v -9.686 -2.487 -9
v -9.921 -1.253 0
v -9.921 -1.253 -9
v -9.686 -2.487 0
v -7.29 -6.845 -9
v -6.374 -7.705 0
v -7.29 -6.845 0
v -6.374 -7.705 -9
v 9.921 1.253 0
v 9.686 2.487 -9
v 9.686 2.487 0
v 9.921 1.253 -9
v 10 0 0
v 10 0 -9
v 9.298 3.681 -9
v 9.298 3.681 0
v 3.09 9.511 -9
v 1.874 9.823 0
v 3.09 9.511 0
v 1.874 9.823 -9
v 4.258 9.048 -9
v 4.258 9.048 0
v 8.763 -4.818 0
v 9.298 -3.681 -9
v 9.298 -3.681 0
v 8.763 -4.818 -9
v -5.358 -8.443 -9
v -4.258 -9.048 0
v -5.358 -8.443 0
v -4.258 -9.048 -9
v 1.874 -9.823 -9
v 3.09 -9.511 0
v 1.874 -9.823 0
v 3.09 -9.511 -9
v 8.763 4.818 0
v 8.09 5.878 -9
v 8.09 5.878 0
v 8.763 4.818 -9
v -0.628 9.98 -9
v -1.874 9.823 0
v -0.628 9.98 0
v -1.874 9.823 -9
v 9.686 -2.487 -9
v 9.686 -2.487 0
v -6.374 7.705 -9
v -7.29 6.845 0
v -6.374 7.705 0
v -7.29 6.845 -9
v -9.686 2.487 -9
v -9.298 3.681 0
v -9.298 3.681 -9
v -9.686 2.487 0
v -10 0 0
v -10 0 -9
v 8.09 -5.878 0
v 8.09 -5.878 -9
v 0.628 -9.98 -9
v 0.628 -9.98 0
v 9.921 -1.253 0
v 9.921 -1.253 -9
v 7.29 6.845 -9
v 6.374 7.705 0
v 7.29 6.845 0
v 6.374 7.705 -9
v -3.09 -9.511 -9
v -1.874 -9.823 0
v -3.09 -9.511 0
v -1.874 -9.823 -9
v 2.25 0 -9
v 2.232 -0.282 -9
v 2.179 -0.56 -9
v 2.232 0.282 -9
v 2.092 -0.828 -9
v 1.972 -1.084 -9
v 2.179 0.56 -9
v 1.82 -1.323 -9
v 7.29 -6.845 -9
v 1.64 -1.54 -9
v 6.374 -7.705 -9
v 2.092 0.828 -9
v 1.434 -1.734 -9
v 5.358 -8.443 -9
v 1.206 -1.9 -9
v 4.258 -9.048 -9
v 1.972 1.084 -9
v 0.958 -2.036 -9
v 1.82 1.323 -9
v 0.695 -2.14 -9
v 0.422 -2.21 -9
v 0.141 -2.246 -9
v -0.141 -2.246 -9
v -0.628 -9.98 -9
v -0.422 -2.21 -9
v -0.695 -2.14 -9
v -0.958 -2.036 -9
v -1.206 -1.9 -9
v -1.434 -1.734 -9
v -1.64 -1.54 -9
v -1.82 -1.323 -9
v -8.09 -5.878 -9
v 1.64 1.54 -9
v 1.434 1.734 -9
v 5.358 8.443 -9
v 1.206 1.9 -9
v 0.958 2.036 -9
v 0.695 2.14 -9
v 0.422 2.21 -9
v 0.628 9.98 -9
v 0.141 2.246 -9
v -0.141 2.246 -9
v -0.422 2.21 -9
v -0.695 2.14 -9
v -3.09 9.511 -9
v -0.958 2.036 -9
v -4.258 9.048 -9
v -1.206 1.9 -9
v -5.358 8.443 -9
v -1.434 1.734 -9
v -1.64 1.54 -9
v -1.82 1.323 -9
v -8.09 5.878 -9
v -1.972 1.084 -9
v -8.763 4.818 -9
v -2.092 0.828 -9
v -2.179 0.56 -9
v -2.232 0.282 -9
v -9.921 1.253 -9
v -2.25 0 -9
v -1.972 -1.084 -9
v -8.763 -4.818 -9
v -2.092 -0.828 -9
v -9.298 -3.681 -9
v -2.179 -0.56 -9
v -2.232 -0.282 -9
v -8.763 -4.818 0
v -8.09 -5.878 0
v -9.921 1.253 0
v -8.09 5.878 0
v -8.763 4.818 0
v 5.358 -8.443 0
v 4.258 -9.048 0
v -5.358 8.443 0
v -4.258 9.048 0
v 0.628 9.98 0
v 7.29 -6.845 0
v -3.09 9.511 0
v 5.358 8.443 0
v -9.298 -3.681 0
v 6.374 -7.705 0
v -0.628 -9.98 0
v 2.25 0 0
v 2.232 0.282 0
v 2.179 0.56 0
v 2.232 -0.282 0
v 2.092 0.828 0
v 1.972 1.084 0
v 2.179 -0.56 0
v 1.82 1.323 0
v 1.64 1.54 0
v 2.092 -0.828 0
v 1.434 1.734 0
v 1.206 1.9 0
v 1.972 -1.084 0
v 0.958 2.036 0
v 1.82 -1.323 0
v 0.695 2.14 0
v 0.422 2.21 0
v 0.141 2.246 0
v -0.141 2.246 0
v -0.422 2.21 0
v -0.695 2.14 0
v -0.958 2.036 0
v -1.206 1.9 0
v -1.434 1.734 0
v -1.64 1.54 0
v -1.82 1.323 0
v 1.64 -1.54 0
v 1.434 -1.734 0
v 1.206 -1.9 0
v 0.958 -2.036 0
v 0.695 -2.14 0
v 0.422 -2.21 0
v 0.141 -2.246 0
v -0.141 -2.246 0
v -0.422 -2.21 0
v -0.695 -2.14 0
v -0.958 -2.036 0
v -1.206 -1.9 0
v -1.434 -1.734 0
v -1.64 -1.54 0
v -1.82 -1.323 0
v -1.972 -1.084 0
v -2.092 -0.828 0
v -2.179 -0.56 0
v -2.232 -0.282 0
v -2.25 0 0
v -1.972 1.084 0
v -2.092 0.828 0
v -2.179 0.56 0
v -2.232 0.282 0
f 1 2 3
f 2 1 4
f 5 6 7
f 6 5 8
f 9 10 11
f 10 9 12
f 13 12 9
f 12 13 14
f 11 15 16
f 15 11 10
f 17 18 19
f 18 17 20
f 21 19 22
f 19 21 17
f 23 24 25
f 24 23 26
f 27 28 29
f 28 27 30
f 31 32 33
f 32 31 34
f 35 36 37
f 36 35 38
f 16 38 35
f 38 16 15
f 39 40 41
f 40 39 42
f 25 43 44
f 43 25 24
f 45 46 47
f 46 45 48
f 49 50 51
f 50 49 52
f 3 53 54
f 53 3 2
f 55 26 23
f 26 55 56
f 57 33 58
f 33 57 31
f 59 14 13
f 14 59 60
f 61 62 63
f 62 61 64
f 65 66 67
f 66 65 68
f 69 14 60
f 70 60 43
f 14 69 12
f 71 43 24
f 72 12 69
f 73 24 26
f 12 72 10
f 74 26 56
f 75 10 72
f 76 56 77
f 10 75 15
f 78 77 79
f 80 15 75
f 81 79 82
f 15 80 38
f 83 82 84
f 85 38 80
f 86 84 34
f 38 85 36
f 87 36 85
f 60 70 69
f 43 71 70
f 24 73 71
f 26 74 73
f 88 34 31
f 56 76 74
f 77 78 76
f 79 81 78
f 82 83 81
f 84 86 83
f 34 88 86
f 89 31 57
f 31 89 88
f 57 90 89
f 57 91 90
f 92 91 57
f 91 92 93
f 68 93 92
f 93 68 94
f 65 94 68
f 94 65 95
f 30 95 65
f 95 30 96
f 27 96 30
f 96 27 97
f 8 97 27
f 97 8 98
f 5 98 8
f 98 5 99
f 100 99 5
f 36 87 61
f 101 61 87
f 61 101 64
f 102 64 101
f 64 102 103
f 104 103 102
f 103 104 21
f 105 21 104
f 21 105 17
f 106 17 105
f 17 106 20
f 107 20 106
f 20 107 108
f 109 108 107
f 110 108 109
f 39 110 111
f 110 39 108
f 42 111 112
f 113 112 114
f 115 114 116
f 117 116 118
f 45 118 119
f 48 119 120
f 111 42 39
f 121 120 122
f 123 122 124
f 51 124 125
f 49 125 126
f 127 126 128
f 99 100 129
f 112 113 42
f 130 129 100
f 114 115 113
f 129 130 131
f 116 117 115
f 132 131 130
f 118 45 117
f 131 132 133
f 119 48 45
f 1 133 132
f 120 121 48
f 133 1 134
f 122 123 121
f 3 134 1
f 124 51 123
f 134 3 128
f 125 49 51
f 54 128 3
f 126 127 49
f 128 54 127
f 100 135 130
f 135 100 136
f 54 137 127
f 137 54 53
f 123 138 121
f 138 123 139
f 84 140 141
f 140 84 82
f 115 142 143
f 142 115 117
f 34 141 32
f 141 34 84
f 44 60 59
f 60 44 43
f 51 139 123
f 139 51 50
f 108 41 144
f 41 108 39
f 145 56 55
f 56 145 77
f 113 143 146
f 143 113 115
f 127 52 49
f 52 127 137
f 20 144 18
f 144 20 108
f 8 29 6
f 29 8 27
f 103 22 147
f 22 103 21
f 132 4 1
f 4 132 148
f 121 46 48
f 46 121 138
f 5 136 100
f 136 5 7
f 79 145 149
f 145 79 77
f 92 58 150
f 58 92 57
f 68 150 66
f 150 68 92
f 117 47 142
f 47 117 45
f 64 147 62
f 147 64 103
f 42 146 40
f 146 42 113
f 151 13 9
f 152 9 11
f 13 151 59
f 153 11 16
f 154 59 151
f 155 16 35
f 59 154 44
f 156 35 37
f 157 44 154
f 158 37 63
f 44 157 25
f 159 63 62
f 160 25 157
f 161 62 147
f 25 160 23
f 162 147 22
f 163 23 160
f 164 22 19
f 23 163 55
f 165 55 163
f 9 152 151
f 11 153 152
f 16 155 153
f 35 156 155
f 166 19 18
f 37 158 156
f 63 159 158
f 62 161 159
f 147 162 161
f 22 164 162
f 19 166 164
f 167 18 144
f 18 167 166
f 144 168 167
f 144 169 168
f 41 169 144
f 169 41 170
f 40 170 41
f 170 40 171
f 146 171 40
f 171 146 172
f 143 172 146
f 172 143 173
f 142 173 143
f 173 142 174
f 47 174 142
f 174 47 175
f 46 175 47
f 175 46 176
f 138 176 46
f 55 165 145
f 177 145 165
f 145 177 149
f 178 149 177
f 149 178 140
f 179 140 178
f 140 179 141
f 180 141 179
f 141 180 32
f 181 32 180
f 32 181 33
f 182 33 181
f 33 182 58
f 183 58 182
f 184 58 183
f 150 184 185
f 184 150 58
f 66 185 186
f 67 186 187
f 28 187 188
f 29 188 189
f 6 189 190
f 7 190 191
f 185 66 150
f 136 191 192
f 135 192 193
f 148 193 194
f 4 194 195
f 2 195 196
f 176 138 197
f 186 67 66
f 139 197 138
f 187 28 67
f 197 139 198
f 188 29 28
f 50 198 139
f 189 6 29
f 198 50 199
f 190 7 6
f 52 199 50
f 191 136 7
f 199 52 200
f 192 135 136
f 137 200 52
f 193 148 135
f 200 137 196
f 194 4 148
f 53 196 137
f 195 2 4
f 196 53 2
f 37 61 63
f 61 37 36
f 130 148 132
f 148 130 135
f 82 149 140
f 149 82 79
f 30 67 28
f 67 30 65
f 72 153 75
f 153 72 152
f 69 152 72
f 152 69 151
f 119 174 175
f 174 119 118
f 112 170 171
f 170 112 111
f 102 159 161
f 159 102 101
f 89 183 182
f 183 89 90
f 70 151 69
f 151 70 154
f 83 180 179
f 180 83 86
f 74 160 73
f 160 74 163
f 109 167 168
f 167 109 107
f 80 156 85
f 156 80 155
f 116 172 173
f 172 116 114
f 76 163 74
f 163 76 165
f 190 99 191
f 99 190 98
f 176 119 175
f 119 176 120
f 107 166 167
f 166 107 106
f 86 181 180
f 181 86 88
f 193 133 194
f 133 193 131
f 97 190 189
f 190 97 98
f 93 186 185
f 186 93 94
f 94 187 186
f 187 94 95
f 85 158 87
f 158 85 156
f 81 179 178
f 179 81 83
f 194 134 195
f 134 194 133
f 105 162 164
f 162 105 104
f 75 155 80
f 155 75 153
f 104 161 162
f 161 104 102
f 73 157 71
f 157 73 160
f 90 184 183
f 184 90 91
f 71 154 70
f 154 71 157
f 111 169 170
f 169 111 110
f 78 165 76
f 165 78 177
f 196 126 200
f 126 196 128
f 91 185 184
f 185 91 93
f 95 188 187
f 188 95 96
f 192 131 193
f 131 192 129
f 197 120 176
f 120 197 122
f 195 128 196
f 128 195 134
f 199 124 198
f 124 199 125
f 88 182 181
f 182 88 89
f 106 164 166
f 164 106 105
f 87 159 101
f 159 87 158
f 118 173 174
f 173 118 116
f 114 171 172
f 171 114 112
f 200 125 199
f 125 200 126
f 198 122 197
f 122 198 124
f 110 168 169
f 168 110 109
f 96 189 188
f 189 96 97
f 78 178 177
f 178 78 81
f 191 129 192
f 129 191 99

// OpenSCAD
$fn = 50;


difference() {
	union() {
		translate(v = [0, 0, -9.0000000000]) {
			cylinder(h = 9, r = 10.0000000000);
		}
		cylinder(h = 0, r = 16.0000000000);
	}
	union() {
		#translate(v = [0, 0, -9]) {
			cylinder(h = 9, r = 2.2500000000);
		}
	}
}
